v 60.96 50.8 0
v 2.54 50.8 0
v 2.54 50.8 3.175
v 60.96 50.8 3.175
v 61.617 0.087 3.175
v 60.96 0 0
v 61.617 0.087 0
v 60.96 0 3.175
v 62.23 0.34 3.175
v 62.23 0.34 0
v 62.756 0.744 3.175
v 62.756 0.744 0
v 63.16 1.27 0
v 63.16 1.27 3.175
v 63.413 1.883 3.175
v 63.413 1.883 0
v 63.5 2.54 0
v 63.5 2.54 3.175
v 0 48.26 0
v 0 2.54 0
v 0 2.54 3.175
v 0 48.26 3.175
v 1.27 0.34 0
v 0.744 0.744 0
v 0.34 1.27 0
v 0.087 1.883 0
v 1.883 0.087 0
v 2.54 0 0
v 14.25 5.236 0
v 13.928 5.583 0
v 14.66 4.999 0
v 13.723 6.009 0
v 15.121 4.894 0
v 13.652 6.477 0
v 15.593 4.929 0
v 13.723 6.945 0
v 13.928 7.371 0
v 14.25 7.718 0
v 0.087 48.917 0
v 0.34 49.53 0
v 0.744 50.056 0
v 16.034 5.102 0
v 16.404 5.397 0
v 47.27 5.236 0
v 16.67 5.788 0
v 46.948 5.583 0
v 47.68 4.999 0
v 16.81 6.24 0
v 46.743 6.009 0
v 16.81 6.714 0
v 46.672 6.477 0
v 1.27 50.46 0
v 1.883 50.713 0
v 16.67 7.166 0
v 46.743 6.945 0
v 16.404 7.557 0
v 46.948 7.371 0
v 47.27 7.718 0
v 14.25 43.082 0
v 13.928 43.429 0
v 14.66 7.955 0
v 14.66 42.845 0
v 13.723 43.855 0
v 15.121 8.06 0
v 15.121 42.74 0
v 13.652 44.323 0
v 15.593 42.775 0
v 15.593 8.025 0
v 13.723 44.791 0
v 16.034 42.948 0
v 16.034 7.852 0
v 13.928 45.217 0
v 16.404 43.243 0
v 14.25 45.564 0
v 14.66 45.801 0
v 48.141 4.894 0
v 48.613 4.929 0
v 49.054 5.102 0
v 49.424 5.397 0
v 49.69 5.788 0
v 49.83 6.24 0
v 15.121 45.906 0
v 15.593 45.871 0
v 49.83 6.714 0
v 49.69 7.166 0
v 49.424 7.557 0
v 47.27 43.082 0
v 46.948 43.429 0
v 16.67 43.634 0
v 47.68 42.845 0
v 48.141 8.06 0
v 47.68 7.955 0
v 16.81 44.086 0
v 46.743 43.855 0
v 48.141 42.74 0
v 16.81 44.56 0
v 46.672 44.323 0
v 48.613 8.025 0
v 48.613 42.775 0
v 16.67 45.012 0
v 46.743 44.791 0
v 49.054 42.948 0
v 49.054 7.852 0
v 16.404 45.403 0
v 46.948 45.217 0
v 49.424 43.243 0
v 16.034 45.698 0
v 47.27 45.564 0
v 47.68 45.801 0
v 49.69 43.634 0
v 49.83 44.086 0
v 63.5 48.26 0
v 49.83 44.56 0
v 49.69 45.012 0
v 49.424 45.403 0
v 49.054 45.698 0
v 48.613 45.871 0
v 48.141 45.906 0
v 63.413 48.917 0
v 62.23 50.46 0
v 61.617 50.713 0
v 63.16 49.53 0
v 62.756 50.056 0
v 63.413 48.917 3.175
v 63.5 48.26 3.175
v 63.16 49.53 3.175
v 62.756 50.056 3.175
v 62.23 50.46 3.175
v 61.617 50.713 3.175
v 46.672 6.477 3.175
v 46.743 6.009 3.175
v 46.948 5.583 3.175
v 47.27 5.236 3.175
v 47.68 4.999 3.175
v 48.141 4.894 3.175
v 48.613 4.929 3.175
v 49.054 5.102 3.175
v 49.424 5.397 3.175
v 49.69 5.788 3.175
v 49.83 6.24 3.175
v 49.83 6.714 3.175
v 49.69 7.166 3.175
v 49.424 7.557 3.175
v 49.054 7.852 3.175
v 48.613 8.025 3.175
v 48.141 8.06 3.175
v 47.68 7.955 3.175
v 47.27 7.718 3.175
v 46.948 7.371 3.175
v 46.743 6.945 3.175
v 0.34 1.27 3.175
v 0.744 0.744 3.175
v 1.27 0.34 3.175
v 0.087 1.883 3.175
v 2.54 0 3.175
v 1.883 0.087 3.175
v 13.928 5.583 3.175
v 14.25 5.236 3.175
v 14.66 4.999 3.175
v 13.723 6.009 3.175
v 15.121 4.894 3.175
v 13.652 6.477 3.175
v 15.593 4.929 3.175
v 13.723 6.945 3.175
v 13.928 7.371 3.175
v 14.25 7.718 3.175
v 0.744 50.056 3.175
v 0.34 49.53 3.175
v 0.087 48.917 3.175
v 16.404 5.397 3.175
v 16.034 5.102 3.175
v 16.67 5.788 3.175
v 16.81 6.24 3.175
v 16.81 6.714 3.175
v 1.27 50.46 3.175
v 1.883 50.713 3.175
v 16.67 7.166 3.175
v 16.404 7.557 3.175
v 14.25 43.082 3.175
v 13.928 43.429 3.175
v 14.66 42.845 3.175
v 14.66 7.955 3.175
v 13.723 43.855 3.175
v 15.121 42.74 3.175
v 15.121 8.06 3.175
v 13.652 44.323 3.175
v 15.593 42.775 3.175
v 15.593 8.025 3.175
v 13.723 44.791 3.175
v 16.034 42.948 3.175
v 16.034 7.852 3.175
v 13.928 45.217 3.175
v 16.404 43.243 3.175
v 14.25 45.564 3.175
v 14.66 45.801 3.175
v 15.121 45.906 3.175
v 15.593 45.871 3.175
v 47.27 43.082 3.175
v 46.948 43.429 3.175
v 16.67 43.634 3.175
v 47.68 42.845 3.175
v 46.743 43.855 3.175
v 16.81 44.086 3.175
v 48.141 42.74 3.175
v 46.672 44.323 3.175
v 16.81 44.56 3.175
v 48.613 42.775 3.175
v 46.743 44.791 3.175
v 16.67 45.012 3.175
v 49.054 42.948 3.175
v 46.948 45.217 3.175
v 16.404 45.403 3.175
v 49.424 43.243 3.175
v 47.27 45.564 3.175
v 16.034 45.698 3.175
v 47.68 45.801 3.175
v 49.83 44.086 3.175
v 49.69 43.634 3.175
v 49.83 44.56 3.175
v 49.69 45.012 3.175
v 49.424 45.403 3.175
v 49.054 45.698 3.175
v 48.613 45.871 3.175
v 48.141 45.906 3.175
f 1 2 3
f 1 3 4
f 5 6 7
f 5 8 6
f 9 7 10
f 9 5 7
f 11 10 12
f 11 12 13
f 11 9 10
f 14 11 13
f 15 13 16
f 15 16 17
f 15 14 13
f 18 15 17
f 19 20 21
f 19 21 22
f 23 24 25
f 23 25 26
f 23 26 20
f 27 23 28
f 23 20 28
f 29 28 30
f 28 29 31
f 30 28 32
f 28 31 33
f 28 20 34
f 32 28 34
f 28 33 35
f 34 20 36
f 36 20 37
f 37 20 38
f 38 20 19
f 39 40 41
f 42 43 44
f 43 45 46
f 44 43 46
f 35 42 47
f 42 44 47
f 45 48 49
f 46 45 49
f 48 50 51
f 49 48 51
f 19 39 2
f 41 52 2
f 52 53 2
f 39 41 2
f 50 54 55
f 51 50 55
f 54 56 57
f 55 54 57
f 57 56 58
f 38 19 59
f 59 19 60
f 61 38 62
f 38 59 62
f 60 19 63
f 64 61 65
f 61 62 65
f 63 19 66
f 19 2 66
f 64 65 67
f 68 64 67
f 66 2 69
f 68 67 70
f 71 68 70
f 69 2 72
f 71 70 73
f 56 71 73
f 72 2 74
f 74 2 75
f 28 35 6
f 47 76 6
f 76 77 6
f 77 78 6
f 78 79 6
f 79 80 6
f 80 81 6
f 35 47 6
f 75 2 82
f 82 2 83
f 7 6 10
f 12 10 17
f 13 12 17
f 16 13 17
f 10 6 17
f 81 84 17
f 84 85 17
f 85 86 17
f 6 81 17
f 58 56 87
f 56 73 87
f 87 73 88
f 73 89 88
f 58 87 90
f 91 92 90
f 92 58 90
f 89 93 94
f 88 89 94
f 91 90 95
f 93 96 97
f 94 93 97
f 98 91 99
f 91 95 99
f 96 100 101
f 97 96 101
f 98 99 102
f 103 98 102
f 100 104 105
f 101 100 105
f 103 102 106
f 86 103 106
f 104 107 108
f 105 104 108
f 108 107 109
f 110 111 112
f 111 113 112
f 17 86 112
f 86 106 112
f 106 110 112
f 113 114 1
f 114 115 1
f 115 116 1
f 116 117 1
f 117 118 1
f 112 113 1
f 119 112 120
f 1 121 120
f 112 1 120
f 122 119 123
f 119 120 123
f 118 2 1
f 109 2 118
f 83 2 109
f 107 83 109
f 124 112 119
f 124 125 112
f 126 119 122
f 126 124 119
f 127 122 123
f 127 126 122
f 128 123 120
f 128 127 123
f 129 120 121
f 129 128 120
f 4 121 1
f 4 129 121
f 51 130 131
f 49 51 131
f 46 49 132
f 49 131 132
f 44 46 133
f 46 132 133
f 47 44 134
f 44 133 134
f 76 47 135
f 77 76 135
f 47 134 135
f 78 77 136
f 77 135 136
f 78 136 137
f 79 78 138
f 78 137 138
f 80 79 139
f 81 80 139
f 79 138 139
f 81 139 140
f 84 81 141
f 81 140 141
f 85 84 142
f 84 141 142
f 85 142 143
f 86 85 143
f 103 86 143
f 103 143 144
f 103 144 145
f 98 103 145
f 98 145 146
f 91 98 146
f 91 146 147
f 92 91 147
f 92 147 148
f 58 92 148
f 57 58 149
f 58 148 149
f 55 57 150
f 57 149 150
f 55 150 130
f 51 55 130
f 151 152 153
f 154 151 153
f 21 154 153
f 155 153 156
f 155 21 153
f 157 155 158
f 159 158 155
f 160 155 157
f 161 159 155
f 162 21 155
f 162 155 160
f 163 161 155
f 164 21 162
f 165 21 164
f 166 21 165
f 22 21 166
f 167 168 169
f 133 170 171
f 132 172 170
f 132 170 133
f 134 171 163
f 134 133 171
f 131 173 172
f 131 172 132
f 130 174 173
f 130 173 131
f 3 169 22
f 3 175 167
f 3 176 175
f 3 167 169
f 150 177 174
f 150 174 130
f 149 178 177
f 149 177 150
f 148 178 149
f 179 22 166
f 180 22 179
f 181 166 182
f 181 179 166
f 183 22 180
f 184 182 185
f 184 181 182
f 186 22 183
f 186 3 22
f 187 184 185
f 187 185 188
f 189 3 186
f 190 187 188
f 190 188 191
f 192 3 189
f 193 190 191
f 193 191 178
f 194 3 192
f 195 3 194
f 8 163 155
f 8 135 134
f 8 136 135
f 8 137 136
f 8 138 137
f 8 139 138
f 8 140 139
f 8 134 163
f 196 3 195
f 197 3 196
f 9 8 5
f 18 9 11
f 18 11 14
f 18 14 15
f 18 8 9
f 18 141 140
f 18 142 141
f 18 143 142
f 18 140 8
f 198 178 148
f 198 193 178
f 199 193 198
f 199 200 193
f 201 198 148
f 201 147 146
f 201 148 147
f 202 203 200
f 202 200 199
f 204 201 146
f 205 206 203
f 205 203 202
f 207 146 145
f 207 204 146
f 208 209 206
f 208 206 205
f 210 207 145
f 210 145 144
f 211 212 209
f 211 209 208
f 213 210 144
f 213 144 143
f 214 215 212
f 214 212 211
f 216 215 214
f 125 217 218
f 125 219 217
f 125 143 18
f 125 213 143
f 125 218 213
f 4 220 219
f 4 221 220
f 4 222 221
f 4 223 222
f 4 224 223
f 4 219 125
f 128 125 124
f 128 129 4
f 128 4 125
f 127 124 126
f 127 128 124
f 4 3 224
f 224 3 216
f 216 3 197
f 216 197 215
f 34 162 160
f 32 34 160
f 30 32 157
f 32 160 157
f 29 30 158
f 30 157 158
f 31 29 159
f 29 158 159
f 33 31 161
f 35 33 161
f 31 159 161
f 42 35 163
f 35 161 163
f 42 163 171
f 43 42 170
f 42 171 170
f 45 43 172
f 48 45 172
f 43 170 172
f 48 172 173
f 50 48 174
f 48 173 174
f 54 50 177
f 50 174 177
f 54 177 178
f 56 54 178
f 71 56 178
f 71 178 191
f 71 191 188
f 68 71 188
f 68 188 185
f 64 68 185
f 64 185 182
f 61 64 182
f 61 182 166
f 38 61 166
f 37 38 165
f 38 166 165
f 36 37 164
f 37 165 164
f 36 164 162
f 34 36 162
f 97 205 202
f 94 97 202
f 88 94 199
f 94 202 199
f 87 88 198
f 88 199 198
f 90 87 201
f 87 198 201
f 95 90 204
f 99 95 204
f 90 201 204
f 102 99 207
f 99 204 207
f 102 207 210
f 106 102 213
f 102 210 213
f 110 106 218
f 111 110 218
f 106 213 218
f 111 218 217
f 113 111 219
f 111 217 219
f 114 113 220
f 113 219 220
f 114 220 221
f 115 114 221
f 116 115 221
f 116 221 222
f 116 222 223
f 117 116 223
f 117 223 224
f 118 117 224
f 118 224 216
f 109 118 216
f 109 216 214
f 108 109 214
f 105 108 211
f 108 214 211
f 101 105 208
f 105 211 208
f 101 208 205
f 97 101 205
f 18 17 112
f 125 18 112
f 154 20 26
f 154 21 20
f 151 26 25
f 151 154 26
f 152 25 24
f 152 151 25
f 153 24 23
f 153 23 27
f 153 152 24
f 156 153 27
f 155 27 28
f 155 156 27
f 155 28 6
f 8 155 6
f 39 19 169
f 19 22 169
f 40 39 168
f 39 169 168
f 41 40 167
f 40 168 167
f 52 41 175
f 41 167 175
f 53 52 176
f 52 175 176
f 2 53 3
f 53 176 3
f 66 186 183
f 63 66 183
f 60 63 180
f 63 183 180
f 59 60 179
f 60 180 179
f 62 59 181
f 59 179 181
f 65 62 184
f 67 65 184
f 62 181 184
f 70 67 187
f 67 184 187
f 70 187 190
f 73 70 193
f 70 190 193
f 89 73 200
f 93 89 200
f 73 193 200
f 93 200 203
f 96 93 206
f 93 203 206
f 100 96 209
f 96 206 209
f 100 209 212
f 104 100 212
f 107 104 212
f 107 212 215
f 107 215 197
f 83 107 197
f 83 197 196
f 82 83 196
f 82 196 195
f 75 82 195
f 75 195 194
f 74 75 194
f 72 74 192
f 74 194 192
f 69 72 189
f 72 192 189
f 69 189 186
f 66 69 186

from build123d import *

# Parameters (mm, degrees)
SKETCH1_W           = 63.5
SKETCH1_H           = 50.8
BOSS_EXTRUDE1_DEPTH = 3.175
FILLET1_R           = 2.54
SKETCH4_R           = 1.5875
CUT_EXTRUDE1_DEPTH  = 3.175


with BuildPart() as part:
    # Sketch1 → Boss-Extrude1 (new body)
    with BuildSketch(Plane.XY):
        with Locations((31.75, 25.4)):
            Rectangle(SKETCH1_W, SKETCH1_H)
    extrude(amount=BOSS_EXTRUDE1_DEPTH)

    # Fillet1
    fillet1_edges = [part.edges().sort_by_distance(p)[0] for p in [
        (0, 50.8, 1.5875),
        (63.5, 50.8, 1.5875),
        (63.5, 0, 1.5875),
        (0, 0, 1.5875),
    ]]
    fillet(fillet1_edges, radius=FILLET1_R)

    # Sketch4 → Cut-Extrude1 (cut)
    with BuildSketch(Plane.XY.offset(3.175)):
        with Locations(Location((15.24, 6.477, 0), (0, 0, 180))):
            Circle(SKETCH4_R)
        with Locations(Location((15.24, 44.323, 0), (0, 0, 180))):
            Circle(SKETCH4_R)
        with Locations(Location((48.26, 44.323, 0), (0, 0, 180))):
            Circle(SKETCH4_R)
        with Locations(Location((48.26, 6.477, 0), (0, 0, 180))):
            Circle(SKETCH4_R)
    extrude(amount=-CUT_EXTRUDE1_DEPTH, mode=Mode.SUBTRACT)


solid = part.part
